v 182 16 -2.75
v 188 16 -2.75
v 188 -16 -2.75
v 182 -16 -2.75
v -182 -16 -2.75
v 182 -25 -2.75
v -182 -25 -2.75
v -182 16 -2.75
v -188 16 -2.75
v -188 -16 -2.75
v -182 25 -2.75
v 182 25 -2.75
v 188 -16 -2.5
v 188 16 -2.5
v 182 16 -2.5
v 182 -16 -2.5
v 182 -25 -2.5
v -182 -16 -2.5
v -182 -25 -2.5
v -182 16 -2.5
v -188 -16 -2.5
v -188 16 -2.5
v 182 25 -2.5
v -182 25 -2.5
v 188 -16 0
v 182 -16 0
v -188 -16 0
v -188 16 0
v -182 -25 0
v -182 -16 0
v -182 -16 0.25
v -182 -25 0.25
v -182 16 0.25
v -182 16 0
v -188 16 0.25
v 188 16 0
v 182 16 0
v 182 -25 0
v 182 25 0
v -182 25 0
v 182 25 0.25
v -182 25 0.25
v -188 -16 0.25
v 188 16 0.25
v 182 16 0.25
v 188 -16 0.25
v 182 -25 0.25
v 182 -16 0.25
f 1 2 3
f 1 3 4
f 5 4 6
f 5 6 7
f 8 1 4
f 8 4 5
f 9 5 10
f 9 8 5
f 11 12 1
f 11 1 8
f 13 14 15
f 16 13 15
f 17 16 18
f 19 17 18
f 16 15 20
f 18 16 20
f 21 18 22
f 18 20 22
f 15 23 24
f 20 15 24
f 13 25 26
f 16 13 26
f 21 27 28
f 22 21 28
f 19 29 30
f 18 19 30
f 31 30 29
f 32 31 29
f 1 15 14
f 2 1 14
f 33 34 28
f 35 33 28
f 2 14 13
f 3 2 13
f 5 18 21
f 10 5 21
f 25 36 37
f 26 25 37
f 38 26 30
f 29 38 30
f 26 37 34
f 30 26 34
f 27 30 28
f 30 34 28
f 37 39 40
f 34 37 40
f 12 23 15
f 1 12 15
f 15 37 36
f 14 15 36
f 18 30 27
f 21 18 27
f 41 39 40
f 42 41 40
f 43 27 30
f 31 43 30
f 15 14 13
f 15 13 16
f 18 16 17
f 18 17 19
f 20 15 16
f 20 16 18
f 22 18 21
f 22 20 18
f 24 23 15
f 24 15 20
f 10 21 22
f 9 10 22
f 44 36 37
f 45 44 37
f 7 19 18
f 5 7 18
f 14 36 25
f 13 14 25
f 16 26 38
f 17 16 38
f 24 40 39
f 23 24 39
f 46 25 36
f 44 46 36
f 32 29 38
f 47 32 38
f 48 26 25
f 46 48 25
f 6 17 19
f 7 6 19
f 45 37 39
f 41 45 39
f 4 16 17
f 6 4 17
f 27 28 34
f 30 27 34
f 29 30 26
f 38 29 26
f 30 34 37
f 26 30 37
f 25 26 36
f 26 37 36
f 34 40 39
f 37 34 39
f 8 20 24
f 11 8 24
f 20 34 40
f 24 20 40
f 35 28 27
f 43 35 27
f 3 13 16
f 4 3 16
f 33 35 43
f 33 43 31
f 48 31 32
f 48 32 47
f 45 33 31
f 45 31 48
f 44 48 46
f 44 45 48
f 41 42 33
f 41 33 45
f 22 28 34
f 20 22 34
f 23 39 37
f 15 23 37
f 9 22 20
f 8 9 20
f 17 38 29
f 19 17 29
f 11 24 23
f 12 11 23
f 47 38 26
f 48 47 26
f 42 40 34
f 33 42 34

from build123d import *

# Parameters (mm, degrees)
BOSS_EXTRUDE1_DEPTH = 0.25
BOSS_EXTRUDE2_DEPTH = 2.5
BOSS_EXTRUDE3_DEPTH = 0.25


with BuildPart() as part:
    # Sketch1 → Boss-Extrude1 (new body)
    with BuildSketch(Plane.XY):
        Polygon((-182, 25), (-182, 16), (-188, 16), (-188, -16), (-182, -16), (-182, -25), (182, -25), (182, -16), (188, -16), (188, 16), (182, 16), (182, 25), align=None)
    extrude(amount=BOSS_EXTRUDE1_DEPTH)


with BuildPart() as body_2:
    # Sketch2 → Boss-Extrude2 (new body)
    with BuildSketch(Plane(origin=(0, 0, 0), x_dir=(-1, 0, 0), z_dir=(0, 0, -1))):
        Polygon((182, 16), (182, 25), (-182, 25), (-182, 16), (-188, 16), (-188, -16), (-182, -16), (-182, -25), (182, -25), (182, -16), (188, -16), (188, 16), align=None)
    extrude(amount=BOSS_EXTRUDE2_DEPTH)


with BuildPart() as body_3:
    # Sketch3 → Boss-Extrude3 (new body)
    with BuildSketch(Plane(origin=(0, 0, -2.5), x_dir=(-1, 0, 0), z_dir=(0, 0, -1))):
        Polygon((182, 16), (182, 25), (-182, 25), (-182, 16), (-188, 16), (-188, -16), (-182, -16), (-182, -25), (182, -25), (182, -16), (188, -16), (188, 16), align=None)
    extrude(amount=BOSS_EXTRUDE3_DEPTH)


solid = Compound([part.part, body_2.part, body_3.part])
